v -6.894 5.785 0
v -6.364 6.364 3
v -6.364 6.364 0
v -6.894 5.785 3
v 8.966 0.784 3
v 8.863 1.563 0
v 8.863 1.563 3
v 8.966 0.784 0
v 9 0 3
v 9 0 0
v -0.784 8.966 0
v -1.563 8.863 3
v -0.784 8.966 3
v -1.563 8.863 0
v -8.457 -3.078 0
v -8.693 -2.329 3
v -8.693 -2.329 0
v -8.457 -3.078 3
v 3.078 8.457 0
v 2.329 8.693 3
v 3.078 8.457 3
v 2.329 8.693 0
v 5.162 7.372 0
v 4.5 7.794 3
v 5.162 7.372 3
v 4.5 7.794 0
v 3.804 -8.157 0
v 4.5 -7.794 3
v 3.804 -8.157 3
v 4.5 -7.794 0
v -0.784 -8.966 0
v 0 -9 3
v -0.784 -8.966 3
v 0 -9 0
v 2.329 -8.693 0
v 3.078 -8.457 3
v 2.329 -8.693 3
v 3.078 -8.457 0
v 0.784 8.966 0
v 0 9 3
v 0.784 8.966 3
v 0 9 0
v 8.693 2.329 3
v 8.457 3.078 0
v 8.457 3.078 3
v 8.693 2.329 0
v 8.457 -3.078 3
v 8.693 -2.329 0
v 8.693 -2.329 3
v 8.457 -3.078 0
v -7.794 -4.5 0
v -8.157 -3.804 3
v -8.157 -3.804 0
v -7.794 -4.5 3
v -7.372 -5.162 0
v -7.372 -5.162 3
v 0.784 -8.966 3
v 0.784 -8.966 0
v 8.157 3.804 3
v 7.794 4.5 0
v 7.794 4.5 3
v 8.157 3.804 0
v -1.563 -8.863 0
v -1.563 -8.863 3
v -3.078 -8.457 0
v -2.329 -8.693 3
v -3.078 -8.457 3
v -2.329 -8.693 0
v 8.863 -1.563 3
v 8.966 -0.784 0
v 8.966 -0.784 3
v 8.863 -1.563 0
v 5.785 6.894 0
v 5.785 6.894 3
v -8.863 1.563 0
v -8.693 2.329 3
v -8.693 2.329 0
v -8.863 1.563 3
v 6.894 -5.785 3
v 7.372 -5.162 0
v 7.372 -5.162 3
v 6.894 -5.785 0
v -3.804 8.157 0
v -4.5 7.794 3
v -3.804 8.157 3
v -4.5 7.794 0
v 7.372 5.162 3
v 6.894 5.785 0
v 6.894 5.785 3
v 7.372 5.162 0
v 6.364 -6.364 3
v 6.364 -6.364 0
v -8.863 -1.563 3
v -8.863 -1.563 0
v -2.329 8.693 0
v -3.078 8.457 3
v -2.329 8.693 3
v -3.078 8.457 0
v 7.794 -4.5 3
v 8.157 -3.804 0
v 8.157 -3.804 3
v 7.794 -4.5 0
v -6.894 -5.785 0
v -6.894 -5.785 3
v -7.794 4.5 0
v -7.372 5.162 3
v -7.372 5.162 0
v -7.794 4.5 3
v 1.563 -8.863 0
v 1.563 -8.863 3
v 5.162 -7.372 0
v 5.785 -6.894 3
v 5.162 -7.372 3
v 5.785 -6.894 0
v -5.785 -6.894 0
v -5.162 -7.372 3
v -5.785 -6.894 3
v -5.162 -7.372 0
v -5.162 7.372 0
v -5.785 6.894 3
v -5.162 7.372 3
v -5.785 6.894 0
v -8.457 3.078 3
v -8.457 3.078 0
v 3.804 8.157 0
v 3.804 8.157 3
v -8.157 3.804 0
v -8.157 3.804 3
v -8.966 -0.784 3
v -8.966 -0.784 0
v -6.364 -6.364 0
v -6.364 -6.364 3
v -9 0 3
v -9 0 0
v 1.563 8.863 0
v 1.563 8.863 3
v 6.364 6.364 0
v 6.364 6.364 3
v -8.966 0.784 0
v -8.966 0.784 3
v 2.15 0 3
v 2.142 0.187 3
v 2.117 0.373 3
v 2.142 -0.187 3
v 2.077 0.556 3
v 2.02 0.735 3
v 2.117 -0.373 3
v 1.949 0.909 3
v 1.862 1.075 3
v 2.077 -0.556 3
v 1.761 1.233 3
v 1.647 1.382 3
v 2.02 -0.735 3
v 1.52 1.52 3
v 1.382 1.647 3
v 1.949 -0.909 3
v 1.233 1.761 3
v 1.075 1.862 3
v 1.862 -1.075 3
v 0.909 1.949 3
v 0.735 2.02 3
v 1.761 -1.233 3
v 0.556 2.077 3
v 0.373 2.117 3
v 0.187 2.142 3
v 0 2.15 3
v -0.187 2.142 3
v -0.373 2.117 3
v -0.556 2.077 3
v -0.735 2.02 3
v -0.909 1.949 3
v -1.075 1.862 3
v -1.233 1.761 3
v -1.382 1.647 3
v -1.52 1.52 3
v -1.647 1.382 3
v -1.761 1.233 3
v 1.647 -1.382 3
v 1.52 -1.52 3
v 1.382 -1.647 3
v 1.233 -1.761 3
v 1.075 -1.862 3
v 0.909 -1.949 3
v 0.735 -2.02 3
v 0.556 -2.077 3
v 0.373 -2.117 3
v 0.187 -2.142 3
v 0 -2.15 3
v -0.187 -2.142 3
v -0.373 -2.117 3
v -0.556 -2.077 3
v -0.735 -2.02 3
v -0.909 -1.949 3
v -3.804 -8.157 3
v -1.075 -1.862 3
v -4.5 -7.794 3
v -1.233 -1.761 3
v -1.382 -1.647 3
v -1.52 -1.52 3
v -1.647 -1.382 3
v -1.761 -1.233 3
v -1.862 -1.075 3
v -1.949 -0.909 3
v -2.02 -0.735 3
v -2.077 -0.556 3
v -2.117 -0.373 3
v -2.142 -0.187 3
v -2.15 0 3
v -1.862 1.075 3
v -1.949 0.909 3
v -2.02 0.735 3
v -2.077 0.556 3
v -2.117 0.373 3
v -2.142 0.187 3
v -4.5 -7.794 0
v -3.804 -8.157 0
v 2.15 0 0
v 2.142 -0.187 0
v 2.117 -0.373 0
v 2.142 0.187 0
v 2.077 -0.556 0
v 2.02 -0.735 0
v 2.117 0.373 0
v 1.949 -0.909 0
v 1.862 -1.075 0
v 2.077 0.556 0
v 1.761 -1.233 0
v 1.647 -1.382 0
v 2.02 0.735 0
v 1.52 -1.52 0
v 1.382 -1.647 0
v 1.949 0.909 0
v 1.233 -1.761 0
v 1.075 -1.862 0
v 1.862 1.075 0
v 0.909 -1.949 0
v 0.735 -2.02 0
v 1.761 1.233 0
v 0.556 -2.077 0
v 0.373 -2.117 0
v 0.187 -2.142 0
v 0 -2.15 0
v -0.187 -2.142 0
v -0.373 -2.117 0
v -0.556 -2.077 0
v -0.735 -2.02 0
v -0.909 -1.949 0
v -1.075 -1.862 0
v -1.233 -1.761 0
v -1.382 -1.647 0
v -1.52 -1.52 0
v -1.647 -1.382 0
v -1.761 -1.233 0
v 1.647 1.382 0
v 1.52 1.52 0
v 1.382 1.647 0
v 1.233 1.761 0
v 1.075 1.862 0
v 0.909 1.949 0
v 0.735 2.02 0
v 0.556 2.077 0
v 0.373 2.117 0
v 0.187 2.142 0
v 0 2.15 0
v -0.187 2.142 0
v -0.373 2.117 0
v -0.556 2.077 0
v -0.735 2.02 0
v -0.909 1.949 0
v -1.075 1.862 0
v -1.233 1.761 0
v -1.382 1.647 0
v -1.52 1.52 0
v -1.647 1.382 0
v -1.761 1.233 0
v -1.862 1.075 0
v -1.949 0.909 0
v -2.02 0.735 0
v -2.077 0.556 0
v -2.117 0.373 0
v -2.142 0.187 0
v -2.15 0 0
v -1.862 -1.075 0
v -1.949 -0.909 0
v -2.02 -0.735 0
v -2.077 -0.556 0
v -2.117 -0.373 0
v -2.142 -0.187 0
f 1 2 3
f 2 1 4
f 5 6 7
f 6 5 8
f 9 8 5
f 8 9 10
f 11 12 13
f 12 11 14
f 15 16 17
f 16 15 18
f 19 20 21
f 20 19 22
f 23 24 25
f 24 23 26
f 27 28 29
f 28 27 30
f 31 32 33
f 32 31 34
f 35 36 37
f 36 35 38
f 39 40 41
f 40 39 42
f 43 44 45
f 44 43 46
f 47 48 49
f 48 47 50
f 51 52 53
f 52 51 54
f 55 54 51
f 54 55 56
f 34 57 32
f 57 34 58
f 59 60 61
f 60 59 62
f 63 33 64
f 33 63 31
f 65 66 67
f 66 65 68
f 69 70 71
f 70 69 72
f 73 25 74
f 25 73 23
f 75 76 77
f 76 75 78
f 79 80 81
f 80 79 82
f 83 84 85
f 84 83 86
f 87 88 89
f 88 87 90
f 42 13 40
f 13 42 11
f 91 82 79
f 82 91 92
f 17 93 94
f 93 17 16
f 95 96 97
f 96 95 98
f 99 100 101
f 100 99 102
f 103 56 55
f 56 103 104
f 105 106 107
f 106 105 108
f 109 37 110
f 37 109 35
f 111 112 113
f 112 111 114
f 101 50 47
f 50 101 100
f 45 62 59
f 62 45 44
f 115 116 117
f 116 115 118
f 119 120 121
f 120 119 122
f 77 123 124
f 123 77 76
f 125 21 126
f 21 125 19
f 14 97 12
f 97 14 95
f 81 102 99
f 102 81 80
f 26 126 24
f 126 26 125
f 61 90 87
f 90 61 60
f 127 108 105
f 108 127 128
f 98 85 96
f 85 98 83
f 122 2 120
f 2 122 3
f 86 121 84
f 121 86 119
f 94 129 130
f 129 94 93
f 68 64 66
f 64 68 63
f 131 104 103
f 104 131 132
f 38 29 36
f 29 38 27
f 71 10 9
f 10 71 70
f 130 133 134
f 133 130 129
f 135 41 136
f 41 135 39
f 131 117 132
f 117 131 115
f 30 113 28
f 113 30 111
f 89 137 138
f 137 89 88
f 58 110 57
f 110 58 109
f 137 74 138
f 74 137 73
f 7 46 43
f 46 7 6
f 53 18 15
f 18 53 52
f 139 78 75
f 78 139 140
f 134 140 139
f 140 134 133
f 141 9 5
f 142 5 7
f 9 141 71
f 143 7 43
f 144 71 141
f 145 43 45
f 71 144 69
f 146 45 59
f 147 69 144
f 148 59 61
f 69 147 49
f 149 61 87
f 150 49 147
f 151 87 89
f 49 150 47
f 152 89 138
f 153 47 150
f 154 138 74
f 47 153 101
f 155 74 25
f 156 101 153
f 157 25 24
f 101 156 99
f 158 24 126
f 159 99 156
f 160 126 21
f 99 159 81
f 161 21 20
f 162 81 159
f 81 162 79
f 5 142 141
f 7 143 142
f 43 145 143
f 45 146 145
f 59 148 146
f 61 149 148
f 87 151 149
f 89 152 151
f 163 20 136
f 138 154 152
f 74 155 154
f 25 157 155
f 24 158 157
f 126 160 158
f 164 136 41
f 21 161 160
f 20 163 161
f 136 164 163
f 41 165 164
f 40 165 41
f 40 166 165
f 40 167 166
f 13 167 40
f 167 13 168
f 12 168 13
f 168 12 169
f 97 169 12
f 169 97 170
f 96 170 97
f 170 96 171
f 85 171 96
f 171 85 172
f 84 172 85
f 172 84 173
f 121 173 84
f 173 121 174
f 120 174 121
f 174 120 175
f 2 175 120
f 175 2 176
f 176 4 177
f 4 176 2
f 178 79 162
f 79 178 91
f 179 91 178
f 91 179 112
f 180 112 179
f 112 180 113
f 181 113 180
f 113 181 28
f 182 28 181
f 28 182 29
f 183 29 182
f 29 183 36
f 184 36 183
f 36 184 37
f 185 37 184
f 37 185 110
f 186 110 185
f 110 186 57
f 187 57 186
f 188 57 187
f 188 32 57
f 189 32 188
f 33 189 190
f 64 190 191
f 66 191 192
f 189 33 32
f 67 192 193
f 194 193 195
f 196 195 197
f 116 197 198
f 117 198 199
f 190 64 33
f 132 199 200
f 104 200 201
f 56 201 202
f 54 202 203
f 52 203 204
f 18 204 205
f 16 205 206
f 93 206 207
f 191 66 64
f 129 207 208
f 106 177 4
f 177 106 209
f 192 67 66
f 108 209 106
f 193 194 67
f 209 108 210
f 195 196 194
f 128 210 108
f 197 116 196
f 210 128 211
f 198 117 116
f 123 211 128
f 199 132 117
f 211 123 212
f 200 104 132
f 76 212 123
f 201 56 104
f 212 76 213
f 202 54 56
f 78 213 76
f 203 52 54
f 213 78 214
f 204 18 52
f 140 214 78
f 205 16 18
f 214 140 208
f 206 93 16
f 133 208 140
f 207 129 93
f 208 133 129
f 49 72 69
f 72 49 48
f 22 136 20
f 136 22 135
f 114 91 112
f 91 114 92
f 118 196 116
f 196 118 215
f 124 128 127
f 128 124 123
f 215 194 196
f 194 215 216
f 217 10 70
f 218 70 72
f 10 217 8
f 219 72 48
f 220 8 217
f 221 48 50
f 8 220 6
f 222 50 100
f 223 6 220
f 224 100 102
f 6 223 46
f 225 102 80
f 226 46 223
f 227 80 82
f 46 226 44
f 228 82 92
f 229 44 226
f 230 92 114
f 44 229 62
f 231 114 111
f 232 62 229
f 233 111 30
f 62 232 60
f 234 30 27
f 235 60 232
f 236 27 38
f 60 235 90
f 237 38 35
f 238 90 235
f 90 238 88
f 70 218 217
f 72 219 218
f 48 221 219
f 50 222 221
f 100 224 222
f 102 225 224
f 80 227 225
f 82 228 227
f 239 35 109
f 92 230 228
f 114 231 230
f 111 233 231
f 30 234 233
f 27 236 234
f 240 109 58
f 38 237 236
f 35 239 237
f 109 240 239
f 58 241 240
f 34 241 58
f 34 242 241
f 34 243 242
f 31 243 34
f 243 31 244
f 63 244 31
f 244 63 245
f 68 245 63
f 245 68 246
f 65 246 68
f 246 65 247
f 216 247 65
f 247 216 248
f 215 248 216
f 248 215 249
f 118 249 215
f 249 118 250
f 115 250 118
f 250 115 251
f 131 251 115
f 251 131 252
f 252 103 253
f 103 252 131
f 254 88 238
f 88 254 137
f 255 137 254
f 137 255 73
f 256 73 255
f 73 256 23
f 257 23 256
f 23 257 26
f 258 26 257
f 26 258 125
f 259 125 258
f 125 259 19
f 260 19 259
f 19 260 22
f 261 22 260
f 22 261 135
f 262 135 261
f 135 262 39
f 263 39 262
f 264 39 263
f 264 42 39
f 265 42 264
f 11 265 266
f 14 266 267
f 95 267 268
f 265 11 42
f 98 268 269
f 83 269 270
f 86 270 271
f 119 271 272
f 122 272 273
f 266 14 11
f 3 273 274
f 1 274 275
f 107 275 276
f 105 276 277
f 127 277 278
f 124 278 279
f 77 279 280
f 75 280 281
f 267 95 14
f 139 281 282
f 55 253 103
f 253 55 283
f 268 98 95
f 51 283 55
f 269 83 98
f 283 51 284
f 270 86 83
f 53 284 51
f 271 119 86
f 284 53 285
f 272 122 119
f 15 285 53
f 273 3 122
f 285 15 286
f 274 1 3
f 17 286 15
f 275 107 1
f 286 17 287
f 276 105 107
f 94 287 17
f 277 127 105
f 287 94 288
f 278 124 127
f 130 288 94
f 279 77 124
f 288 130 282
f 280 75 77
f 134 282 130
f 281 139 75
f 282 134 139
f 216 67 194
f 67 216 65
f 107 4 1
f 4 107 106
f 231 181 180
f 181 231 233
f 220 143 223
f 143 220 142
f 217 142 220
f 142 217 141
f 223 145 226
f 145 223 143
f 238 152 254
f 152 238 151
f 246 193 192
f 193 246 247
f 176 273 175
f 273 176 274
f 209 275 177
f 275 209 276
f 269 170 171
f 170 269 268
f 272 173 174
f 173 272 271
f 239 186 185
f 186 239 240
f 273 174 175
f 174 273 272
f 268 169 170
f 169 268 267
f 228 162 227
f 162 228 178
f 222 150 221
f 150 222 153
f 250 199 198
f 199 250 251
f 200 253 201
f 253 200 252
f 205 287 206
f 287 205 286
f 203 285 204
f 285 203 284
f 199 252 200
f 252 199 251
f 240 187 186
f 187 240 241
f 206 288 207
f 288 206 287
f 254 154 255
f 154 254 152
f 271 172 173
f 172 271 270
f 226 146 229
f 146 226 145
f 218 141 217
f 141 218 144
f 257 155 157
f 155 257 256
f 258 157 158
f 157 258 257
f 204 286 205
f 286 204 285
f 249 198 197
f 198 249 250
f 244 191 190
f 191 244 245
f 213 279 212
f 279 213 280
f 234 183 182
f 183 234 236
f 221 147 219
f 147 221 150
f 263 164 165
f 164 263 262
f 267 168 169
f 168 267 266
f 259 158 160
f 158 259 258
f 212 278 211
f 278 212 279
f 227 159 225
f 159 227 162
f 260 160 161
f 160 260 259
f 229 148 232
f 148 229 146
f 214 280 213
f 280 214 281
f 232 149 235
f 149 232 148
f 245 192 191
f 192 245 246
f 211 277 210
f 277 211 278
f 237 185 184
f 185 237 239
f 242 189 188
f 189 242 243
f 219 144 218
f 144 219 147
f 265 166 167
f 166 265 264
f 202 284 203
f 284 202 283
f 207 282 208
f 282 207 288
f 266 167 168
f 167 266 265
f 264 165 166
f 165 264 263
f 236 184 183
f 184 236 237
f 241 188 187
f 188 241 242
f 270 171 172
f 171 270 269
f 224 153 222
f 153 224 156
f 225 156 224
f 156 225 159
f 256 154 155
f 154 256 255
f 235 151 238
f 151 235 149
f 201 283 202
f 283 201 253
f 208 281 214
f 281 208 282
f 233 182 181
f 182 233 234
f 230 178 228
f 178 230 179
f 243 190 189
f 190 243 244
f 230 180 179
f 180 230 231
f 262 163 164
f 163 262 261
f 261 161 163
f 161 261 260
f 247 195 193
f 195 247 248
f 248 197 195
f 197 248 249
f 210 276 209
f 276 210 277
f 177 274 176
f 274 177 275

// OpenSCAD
// file: parameters.scad
// AFPM-Desk-v2 shared parameters (mm)
// Dual-rotor axial-flux PM learning generator with steel back-iron.
// Faraday induction education only — not free-energy / overunity.
// Target printer: Anycubic Kobra 3 Max, 0.4 mm nozzle, 0.2 mm layers, PLA/PETG.

$fn = 72;

// --- Printer / FDM assumptions ---
nozzle = 0.4;
layer = 0.2;
wall = 1.6;                 // load-bearing walls ~4 perimeters
housing_wall = 2.4;
clearance_slip = 0.35;      // shaft slip fit
clearance_loose = 0.55;
press_interference = 0.15;  // bearing pocket undersize total (coupon-test)
magnet_pocket_xy = 0.25;    // +0.25 mm on diameter
magnet_pocket_z = 0.15;     // +0.15 mm depth
elephant_foot = 0.5;

// --- Magnets (N42 Neo discs) ---
magnet_d = 20;
magnet_h = 3;
magnet_count = 8;           // per rotor (8+8 total)
magnet_pcd = 70;

// --- Steel back-iron (purchased mild steel disc) ---
steel_od = 100;
steel_id = 14;              // clearance around hub boss
steel_h = 1.5;              // 1.5–2.0 mm mild steel OK
steel_recess_clearance = 0.3;

// --- Rotor printed disc ---
rotor_od = 110;
rotor_hub_bore = 12;        // seats on shaft_hub boss
rotor_thickness = 7;        // magnet pocket from face; steel recess on back
magnet_pocket_depth = magnet_h + magnet_pocket_z;
steel_recess_depth = steel_h + 0.2;

// --- Stator (coreless, between rotors) ---
stator_od = 120;
stator_id = 28;
stator_thickness = 10;
coil_count = 6;
coil_slot_w = 24;
coil_slot_l = 30;           // radial length of pocket
coil_slot_depth = 8;
coil_pcd = 70;
stator_pillar_pcd = 100;    // M4 pillar holes

// --- Coil former / bobbin ---
former_core_w = 14;
former_core_l = 26;
former_flange = 3;
former_wind_h = 11;
former_bore = 0;            // solid core, split design via kerf

// --- Shaft / bearings ---
shaft_d = 8;
bearing_od = 22;            // 608-2RS
bearing_id = 8;
bearing_h = 7;
bearing_seat_od = bearing_od - press_interference; // coupon-test; start ~21.85

// --- Base / frame ---
base_w = 180;
base_d = 160;
base_h = 8;
post_h = 70;
post_spacing = 120;         // Y distance between bearing post centers
post_d = 36;

// --- Axial stack targets (along shaft / Y) ---
// crank | brg | hub+rotorA+steel | air | stator | air | steel+rotorB+hub | brg
air_gap_nominal = 2.0;      // mechanical per side magnet↔coil face

// --- Crank ---
crank_arm_len = 85;
crank_arm_w = 18;
crank_arm_t = 10;
handle_d = 14;
handle_len = 45;

// --- Electronics tray ---
tray_w = 75;
tray_d = 55;
tray_h = 14;

// --- Fasteners ---
m3_clear = 3.4;
m3_tap = 2.5;
m4_clear = 4.3;
// main file
include <parameters.scad>
// Optional clamp washer for M4 stator pillars. Print 3–6.

module stator_clamp() {
  difference() {
    cylinder(h=3, d=18);
    translate([0,0,-0.1])
      cylinder(h=3.2, d=m4_clear);
  }
}

stator_clamp();
